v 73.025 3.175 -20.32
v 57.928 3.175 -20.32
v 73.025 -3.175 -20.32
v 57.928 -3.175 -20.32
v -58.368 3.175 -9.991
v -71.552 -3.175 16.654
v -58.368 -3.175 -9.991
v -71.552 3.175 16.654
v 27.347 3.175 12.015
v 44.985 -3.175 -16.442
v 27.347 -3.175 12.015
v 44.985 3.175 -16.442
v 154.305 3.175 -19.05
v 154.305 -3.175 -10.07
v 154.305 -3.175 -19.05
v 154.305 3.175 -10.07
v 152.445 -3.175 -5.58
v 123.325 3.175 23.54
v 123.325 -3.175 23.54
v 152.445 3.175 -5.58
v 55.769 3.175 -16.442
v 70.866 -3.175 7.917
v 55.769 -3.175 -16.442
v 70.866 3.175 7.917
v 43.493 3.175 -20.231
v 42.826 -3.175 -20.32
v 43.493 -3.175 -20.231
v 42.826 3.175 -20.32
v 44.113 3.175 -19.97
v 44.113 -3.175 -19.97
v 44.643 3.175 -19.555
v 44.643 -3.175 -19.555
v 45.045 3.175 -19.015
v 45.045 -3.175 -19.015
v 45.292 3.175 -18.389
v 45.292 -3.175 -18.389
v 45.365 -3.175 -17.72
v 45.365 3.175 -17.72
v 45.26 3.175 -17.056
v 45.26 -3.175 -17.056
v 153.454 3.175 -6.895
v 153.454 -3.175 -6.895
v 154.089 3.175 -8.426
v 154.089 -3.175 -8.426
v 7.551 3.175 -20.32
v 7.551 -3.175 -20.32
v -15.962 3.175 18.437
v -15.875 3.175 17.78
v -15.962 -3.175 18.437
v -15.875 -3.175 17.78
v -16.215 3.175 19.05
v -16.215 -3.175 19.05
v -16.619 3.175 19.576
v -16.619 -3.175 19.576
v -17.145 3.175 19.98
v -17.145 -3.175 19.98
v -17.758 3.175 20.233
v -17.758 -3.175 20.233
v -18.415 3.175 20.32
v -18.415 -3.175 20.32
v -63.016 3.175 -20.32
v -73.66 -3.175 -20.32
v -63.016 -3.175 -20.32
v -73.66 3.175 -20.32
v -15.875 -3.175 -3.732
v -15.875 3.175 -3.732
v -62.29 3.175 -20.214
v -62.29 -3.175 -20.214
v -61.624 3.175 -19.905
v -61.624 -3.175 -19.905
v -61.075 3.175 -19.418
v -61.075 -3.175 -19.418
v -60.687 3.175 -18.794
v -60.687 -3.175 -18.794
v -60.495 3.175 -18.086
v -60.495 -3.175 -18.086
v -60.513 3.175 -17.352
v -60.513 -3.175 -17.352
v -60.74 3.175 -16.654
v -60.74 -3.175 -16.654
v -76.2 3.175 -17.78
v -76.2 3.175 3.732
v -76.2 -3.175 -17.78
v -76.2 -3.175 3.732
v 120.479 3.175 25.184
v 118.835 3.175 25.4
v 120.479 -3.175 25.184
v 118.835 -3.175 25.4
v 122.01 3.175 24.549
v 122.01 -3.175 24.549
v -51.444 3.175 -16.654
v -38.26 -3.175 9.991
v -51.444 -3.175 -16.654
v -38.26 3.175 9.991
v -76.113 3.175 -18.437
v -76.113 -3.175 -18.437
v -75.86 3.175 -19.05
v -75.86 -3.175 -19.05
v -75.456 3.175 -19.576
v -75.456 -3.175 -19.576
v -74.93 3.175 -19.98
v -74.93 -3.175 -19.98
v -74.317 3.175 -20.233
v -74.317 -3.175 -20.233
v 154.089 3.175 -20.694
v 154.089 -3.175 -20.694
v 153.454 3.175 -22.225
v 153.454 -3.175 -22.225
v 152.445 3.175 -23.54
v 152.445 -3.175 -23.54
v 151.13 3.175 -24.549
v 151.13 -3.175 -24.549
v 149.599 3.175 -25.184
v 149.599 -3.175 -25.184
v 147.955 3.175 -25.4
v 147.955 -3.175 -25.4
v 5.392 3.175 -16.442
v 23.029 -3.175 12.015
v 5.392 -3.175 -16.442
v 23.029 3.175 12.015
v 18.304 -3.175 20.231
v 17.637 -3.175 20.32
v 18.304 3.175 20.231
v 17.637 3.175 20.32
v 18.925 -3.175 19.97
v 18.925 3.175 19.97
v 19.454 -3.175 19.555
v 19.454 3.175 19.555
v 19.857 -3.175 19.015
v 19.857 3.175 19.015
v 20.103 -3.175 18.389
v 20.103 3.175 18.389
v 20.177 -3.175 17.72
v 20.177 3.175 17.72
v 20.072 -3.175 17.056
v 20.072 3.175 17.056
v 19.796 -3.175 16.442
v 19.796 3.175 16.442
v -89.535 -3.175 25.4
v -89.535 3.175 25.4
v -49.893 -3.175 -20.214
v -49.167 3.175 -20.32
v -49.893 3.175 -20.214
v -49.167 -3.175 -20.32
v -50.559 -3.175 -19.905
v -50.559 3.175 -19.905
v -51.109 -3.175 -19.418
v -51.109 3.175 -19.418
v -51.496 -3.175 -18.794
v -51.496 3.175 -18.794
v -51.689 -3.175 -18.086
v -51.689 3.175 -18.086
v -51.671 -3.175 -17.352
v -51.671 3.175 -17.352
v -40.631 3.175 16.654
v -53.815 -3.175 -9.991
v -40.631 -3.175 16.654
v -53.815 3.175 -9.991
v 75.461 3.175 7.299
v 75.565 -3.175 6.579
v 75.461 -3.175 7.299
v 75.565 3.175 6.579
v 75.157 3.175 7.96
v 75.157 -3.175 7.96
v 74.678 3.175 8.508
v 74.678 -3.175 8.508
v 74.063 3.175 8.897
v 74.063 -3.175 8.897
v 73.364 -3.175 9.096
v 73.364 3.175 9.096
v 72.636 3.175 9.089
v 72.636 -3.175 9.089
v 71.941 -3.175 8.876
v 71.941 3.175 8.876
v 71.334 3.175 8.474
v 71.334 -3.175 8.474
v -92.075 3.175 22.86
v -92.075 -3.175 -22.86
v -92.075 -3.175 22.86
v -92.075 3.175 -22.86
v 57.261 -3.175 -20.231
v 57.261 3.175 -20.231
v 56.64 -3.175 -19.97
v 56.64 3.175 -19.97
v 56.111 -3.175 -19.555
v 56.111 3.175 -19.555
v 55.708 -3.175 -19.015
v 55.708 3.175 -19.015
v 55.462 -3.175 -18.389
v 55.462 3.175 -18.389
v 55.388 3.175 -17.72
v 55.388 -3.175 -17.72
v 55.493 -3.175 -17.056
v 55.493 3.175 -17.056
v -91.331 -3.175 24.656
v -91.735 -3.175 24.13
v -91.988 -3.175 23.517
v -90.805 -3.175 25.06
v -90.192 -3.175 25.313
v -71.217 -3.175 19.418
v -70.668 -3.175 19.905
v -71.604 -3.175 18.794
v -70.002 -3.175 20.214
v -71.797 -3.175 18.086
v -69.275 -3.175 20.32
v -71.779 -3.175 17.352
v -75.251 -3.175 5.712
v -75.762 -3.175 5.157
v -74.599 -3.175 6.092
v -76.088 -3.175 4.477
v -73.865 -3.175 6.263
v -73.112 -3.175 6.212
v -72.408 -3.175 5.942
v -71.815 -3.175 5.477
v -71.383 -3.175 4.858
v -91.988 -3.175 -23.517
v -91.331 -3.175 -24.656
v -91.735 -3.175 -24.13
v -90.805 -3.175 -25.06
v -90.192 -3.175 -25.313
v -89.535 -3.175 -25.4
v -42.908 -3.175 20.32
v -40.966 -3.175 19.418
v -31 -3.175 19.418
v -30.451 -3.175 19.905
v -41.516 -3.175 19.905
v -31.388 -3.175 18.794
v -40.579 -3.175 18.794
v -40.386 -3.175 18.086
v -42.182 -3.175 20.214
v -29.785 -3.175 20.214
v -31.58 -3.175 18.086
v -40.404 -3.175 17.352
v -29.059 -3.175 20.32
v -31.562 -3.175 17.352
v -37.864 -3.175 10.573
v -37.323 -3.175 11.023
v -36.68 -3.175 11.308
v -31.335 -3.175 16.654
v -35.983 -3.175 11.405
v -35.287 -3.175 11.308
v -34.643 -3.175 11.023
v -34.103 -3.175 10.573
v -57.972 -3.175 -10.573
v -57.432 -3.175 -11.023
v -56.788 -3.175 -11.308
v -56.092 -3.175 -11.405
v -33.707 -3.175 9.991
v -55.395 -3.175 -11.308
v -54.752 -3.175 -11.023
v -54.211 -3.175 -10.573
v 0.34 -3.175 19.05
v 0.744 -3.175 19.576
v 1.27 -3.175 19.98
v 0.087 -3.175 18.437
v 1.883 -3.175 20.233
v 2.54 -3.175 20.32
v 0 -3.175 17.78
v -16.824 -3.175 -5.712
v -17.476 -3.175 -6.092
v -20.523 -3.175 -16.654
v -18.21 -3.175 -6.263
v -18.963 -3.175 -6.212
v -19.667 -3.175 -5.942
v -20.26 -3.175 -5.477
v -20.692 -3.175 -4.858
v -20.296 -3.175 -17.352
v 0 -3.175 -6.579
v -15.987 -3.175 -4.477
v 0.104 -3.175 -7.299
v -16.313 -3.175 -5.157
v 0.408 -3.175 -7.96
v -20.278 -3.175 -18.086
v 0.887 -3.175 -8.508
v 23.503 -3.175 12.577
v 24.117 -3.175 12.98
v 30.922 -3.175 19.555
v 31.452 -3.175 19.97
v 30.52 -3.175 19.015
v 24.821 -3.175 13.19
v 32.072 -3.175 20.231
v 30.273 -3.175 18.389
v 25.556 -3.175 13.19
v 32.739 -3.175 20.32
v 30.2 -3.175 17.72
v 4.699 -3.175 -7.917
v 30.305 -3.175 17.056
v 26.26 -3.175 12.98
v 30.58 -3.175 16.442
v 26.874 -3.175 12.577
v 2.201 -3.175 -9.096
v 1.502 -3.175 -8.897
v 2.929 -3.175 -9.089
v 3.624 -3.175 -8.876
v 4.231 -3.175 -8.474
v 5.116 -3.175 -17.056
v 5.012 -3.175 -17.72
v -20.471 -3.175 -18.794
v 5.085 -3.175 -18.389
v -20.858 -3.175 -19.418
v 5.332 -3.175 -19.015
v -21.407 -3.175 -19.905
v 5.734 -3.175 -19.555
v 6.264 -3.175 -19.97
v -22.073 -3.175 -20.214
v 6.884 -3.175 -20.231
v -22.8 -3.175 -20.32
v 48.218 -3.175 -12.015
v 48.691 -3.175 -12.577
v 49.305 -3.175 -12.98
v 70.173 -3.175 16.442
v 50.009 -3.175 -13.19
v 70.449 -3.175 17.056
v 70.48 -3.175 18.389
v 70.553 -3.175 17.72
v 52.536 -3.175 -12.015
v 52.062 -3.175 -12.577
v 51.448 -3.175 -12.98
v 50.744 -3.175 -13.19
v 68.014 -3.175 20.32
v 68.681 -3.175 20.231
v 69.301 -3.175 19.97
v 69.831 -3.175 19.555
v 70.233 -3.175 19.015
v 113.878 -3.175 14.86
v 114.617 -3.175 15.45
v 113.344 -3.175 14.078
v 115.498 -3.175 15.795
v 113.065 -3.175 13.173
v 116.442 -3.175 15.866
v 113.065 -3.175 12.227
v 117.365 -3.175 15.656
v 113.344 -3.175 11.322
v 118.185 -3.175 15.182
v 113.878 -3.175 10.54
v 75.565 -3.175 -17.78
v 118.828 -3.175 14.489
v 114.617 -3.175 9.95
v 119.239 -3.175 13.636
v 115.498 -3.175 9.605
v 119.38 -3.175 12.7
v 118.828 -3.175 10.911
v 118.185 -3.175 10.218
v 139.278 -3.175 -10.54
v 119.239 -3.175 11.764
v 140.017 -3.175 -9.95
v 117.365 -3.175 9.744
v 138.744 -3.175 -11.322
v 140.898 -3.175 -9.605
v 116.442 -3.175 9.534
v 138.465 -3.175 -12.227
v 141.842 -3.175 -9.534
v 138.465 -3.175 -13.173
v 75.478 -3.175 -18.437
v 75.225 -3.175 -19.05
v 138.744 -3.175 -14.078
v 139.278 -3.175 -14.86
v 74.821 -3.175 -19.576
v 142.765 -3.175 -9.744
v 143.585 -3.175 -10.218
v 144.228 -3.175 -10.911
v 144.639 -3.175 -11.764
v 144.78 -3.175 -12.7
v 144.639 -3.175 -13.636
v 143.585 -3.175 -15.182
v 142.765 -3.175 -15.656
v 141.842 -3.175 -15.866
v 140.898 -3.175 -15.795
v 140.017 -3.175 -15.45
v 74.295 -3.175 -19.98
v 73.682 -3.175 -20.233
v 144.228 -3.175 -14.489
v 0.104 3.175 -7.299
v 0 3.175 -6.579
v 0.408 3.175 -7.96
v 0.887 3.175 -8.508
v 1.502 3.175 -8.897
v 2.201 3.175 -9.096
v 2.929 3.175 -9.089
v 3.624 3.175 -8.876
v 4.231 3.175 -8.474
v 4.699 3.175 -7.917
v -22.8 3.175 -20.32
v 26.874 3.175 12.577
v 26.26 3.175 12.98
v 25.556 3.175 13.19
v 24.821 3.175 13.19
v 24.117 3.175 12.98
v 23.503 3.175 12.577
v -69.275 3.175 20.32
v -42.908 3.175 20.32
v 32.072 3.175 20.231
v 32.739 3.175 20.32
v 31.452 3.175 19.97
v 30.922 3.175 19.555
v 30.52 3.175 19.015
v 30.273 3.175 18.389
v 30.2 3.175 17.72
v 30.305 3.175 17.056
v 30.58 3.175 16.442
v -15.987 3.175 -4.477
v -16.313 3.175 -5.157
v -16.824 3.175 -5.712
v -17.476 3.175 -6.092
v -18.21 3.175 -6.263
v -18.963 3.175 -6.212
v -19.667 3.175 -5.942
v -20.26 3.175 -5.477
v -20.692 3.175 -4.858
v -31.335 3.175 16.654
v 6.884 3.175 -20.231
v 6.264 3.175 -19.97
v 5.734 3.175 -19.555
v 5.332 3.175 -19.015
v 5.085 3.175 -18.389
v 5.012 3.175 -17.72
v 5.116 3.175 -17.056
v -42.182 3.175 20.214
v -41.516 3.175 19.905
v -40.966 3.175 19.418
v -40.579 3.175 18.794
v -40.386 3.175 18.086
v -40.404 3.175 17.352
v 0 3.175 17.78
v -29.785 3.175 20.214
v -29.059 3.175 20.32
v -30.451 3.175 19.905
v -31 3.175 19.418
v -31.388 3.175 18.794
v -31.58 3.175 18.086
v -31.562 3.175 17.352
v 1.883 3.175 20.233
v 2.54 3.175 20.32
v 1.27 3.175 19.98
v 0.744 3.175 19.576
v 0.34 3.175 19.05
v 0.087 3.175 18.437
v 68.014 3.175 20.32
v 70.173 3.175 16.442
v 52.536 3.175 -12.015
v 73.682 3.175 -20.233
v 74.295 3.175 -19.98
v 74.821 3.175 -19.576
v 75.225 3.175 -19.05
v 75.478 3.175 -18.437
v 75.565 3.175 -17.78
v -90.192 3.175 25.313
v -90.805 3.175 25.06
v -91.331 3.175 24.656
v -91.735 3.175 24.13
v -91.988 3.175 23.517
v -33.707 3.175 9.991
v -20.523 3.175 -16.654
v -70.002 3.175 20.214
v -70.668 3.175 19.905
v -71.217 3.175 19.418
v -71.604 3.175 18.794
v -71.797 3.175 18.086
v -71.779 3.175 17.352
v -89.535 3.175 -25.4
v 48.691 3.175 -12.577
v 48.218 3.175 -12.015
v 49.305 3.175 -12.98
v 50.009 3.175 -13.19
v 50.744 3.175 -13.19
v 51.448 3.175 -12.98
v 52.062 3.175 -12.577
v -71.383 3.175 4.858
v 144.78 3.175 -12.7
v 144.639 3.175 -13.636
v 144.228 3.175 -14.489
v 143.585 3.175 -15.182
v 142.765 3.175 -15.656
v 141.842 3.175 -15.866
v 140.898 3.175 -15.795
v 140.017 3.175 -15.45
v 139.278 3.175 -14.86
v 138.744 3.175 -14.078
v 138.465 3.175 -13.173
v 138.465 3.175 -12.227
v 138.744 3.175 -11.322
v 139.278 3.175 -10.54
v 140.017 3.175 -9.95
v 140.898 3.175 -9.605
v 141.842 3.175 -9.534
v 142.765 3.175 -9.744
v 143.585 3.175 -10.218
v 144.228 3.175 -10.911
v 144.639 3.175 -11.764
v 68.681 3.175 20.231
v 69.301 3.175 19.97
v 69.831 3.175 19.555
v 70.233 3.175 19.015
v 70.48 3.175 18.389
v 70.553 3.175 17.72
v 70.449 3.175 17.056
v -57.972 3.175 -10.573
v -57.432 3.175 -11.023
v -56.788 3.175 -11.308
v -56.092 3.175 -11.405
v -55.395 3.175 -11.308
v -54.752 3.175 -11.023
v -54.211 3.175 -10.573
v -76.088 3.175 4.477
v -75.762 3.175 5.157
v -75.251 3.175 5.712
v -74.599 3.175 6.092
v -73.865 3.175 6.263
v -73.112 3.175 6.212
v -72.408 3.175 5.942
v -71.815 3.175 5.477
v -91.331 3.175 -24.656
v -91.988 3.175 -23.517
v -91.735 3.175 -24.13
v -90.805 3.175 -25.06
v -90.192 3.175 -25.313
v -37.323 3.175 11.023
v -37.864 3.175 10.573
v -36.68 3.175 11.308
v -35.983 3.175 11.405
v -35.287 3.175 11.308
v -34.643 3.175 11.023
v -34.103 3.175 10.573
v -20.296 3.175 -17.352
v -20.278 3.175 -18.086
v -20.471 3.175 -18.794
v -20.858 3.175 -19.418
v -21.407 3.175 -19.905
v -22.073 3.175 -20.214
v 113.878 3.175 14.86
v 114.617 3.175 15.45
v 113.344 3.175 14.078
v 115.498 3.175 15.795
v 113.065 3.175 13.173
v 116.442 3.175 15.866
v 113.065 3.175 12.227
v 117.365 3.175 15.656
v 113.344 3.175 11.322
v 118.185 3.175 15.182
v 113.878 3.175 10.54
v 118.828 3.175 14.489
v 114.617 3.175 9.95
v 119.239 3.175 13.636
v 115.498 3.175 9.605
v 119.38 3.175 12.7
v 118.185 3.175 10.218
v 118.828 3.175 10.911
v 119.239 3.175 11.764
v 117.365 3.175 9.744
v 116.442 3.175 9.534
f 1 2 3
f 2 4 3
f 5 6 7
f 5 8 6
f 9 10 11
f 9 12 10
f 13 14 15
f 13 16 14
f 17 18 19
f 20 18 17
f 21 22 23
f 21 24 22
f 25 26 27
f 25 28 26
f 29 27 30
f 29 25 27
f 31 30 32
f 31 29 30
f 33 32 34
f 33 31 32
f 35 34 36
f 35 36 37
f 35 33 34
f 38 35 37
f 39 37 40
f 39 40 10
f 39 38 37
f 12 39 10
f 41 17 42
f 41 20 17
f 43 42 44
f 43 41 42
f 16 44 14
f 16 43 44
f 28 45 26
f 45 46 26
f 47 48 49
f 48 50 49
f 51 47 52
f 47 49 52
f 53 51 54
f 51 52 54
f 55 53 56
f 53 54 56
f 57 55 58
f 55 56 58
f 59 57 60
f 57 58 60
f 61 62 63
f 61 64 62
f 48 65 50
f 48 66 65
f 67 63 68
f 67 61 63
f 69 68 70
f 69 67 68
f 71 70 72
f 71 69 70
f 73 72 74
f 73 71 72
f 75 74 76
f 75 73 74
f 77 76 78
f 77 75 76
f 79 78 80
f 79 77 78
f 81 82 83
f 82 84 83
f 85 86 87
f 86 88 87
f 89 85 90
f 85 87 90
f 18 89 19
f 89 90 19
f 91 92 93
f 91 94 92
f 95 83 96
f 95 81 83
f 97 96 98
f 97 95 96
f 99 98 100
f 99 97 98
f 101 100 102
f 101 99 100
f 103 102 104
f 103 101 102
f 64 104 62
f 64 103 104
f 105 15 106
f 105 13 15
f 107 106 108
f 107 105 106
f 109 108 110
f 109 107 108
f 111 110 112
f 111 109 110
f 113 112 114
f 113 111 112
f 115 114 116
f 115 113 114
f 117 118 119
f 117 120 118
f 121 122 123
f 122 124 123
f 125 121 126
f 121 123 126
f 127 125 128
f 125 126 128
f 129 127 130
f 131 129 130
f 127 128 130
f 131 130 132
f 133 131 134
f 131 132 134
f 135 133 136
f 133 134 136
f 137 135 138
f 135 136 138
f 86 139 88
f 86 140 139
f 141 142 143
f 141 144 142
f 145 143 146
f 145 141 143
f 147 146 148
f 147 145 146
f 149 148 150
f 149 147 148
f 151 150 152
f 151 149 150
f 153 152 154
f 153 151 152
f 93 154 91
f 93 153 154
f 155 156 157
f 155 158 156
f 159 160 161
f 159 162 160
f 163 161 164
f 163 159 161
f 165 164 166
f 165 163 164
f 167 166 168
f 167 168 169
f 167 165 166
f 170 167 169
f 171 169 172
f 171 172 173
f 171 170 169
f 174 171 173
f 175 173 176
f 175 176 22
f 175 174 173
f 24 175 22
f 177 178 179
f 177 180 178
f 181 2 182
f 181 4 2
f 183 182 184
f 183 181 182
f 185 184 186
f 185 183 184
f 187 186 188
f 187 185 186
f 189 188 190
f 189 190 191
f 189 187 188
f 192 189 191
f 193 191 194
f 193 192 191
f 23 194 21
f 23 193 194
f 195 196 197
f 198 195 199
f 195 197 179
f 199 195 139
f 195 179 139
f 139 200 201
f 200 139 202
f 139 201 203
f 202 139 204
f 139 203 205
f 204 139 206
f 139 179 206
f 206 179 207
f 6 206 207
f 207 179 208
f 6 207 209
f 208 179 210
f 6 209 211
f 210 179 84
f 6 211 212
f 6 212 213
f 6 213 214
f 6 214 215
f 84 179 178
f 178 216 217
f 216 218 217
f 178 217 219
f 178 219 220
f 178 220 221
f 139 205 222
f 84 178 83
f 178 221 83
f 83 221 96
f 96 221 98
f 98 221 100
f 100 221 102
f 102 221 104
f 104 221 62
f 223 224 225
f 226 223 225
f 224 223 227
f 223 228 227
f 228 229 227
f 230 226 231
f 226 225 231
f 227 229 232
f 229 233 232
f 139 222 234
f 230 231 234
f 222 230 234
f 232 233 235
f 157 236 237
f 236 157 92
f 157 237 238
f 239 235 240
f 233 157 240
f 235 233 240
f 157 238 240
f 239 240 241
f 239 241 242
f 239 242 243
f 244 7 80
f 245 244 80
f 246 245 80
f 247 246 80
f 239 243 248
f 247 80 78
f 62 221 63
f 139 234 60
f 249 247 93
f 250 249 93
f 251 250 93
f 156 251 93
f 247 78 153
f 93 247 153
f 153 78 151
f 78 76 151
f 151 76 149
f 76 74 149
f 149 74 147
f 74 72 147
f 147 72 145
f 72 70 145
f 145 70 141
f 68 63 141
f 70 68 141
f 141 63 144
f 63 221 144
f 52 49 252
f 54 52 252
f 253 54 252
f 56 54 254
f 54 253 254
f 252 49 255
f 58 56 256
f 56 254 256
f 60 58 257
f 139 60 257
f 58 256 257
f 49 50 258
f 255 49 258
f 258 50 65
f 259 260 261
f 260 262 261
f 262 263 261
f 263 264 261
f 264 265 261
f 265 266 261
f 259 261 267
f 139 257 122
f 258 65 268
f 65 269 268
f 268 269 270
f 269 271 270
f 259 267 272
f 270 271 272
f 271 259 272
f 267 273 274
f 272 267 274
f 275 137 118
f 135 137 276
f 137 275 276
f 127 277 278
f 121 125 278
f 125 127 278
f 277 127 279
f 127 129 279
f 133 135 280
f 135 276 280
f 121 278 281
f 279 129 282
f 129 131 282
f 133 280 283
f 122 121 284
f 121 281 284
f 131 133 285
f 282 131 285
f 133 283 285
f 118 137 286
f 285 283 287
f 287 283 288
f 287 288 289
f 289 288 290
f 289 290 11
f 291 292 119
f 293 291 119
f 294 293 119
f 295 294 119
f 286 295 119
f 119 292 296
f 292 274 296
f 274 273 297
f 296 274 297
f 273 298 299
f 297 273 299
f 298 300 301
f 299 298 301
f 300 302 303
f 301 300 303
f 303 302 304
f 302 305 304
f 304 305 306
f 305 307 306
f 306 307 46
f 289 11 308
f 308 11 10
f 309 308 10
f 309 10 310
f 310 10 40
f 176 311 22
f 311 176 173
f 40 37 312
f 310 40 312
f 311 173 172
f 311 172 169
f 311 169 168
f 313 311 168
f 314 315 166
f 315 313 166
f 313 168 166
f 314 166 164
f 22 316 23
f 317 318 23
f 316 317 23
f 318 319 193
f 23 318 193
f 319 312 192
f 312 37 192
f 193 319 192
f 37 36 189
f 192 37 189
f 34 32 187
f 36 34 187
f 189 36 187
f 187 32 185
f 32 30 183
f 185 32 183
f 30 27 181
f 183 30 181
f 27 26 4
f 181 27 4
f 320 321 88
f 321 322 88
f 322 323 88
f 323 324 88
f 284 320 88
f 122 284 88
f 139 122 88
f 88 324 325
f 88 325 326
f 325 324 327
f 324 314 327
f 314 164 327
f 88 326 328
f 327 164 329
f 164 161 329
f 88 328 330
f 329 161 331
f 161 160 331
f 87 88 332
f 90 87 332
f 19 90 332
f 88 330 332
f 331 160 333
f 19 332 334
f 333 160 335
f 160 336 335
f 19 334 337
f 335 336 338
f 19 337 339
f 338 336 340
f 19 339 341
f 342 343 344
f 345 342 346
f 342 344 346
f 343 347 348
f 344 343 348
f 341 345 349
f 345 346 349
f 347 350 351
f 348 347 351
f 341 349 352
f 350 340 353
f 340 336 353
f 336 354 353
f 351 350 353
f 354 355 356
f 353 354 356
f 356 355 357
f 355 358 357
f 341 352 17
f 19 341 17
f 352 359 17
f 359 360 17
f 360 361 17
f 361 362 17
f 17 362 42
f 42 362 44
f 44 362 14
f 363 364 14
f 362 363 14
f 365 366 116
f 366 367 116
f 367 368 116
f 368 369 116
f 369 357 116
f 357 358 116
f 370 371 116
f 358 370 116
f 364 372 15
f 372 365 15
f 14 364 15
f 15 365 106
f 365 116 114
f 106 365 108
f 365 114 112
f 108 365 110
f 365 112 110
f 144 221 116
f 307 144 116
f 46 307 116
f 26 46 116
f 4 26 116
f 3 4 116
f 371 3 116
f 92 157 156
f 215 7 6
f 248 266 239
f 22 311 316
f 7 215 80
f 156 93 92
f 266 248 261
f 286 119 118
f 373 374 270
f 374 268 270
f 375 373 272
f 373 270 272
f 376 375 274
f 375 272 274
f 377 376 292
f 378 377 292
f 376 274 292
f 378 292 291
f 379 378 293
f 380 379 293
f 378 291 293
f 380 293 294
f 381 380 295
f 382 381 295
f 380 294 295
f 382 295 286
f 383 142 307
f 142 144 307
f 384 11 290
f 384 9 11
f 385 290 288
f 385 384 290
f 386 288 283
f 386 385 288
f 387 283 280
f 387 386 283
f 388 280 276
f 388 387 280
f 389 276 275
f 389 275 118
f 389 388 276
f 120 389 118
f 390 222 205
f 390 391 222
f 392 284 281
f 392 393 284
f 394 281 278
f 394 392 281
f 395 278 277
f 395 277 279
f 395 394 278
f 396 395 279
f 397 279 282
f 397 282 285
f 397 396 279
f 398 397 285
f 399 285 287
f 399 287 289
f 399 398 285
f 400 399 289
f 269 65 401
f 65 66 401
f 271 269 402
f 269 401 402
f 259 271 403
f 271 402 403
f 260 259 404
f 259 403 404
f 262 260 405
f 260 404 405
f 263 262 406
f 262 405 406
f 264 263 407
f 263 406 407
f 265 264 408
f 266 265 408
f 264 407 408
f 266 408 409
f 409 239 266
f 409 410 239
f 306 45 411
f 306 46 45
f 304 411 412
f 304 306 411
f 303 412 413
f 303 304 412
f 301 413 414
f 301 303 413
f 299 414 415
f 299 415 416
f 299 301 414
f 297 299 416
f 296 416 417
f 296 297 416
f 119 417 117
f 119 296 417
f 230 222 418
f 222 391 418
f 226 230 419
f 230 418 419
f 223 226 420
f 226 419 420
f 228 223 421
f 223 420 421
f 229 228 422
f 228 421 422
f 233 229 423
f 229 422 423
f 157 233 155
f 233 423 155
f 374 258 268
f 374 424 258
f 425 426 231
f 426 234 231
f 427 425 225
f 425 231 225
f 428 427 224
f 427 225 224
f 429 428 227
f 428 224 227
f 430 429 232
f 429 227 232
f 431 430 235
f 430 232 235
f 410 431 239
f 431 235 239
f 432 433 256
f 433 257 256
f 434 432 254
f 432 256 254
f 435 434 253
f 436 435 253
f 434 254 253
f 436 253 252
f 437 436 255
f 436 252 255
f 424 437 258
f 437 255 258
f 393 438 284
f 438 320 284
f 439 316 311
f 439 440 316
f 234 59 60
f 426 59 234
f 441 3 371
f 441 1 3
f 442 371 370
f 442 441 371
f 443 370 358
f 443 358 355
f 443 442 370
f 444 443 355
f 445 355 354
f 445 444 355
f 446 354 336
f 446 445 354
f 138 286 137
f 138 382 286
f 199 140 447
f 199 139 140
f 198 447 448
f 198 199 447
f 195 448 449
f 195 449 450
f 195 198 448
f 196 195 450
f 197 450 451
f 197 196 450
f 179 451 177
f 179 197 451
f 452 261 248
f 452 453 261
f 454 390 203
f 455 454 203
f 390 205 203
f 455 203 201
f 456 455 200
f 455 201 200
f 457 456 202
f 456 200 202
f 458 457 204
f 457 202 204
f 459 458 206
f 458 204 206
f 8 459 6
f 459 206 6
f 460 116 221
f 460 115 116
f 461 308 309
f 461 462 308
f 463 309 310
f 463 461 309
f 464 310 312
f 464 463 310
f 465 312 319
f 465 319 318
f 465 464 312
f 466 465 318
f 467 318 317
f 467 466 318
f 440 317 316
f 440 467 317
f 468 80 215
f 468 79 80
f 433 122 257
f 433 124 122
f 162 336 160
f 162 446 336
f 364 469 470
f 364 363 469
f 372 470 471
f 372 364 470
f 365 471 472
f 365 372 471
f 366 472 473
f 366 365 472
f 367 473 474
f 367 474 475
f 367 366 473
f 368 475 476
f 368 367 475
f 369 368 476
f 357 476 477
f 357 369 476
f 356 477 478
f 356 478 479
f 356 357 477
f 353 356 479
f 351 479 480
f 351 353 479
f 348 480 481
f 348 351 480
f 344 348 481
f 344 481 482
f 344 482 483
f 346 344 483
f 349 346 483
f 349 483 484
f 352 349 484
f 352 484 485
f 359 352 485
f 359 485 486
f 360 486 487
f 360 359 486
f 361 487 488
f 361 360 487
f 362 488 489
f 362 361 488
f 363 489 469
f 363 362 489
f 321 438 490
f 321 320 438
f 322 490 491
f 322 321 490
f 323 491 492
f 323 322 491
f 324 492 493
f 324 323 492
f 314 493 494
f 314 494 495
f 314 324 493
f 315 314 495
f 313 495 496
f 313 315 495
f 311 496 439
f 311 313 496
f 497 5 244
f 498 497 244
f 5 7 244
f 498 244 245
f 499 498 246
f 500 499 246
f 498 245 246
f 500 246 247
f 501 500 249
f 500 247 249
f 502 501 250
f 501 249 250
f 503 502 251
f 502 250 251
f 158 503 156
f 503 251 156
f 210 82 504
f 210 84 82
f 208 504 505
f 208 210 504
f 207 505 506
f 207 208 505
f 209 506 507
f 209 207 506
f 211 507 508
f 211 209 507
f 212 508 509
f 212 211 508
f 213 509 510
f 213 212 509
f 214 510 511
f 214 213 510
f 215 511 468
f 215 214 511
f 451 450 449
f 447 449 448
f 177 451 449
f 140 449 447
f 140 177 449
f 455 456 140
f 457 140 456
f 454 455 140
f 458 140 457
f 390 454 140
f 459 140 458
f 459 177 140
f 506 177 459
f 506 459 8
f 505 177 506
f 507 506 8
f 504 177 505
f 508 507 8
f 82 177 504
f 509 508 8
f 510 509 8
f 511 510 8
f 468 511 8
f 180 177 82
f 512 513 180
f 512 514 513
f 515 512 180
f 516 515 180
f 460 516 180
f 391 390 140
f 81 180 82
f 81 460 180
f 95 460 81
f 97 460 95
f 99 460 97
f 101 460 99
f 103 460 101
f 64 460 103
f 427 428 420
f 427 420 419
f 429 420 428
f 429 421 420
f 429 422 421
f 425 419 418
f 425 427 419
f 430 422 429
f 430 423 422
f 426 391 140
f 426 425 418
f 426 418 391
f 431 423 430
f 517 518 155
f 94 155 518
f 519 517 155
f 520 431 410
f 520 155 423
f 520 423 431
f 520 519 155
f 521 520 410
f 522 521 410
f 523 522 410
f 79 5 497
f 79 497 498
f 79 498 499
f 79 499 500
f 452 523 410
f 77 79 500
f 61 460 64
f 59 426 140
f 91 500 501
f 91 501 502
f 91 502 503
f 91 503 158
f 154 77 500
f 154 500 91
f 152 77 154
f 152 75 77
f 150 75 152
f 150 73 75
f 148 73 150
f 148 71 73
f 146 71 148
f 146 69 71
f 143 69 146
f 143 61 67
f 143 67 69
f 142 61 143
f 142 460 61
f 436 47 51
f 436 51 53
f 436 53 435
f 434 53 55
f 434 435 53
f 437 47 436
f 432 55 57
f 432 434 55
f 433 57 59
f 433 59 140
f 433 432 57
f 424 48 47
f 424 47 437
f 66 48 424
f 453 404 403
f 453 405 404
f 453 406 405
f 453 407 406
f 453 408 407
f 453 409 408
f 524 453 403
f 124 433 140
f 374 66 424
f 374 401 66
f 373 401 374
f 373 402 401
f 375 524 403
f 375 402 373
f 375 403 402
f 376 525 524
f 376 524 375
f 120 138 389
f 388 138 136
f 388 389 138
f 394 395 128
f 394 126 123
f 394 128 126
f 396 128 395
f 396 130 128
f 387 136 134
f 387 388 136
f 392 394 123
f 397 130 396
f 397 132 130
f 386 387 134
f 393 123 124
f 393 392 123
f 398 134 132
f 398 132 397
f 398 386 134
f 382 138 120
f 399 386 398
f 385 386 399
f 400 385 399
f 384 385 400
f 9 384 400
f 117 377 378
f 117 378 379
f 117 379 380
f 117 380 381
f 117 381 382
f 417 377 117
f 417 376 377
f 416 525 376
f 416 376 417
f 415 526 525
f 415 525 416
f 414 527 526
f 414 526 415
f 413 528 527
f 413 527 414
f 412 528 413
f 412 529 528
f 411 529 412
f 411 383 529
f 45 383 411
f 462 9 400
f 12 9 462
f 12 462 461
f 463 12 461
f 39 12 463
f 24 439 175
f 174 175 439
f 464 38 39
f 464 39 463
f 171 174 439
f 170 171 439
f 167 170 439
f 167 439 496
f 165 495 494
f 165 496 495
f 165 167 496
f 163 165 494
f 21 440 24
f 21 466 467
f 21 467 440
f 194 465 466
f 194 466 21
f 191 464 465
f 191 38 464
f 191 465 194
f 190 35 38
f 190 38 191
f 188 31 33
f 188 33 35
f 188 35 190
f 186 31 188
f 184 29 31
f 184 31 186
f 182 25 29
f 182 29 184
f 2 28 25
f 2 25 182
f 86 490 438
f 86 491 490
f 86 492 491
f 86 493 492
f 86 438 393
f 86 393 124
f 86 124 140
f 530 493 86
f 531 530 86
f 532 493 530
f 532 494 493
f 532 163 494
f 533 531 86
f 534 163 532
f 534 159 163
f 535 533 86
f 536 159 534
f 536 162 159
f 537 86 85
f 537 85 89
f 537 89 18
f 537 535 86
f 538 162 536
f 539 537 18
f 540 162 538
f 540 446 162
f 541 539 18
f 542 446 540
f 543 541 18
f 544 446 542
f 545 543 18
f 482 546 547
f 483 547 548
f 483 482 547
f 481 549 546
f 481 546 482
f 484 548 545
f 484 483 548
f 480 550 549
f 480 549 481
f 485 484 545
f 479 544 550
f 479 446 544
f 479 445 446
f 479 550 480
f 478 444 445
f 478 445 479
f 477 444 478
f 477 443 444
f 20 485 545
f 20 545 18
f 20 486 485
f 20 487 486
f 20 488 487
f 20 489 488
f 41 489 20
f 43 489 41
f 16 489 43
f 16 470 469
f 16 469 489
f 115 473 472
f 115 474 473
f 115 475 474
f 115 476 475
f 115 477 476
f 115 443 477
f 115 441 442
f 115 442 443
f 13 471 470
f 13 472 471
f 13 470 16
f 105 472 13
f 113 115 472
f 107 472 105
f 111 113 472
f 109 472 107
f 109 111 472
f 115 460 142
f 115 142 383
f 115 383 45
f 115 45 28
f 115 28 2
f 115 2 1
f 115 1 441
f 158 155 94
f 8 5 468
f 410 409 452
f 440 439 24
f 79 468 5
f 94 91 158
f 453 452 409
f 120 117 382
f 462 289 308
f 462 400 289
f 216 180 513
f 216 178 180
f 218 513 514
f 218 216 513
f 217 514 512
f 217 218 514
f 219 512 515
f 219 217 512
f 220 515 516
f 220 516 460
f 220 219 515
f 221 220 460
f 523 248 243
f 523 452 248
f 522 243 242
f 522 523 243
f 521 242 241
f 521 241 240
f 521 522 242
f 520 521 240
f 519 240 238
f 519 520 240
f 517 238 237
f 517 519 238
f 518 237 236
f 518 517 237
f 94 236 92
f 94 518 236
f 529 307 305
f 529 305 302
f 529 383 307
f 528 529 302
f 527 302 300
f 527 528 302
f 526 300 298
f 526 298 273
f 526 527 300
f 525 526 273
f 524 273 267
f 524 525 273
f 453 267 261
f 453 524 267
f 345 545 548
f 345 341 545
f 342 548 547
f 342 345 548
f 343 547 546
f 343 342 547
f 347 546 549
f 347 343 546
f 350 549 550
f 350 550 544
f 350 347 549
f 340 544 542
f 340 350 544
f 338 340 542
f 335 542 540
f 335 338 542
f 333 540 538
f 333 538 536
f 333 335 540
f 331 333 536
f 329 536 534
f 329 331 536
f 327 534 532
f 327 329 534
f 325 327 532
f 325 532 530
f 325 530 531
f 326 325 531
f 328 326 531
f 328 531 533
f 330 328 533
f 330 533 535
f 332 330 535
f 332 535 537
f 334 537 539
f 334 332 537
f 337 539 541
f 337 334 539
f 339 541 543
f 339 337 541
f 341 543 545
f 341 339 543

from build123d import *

# Parameters (mm, degrees)
SKETCH1_R           = 3.175
BOSS_EXTRUDE1_DEPTH = 3.175
FILLET1_R           = 2.54
FILLET2_R           = 6.35


with BuildPart() as part:
    # Sketch1 → Boss-Extrude1 (new body, symmetric)
    with BuildSketch(Plane(origin=(0, 0, 0), x_dir=(1, 0, 0), z_dir=(0, 1, 0))):
        Polygon((121.465512242, -25.4), (154.305, 7.439487758), (154.305, 25.4), (-92.075, 25.4), (-92.075, -25.4), align=None)
        Polygon((-38.817248104, -20.32), (-73.366085229, -20.32), (-56.091666667, 14.592509095), align=None, mode=Mode.SUBTRACT)
        Polygon((-15.875, 14.592509095), (-15.875, -20.32), (-33.149418563, -20.32), align=None, mode=Mode.SUBTRACT)
        Polygon((22.200034711, -20.32), (0, -20.32), (0, 15.498543399), align=None, mode=Mode.SUBTRACT)
        with Locations((116.205, -12.7)):
            Circle(SKETCH1_R, mode=Mode.SUBTRACT)
        Polygon((72.576701378, -20.32), (28.176631956, -20.32), (50.376666667, 15.498543399), align=None, mode=Mode.SUBTRACT)
        Polygon((53.364965289, 20.32), (75.565, 20.32), (75.565, -15.498543399), align=None, mode=Mode.SUBTRACT)
        Polygon((-76.2, -14.592509095), (-76.2, 20.32), (-58.925581437, 20.32), align=None, mode=Mode.SUBTRACT)
        Polygon((-53.257751896, 20.32), (-18.708914771, 20.32), (-35.983333333, -14.592509095), align=None, mode=Mode.SUBTRACT)
        Polygon((2.988298622, 20.32), (47.388368044, 20.32), (25.188333333, -15.498543399), align=None, mode=Mode.SUBTRACT)
        with Locations((141.605, 12.7)):
            Circle(SKETCH1_R, mode=Mode.SUBTRACT)
    extrude(amount=BOSS_EXTRUDE1_DEPTH, both=True)

    # Fillet1
    fillet1_edges = [part.edges().sort_by_distance(p)[0] for p in [
        (-76.2, 0, -20.32),
        (-76.2, 0, 14.592509095),
        (-58.925581437, 0, -20.32),
        (2.988298622, 0, -20.32),
        (25.188333333, 0, 15.498543399),
        (47.388368044, 0, -20.32),
        (0, 0, -15.498543399),
        (0, 0, 20.32),
        (22.200034711, 0, 20.32),
        (72.576701378, 0, 20.32),
        (50.376666667, 0, -15.498543399),
        (28.176631956, 0, 20.32),
        (75.565, 0, 15.498543399),
        (75.565, 0, -20.32),
        (53.364965289, 0, -20.32),
        (-15.875, 0, 20.32),
        (-15.875, 0, -14.592509095),
        (-33.149418563, 0, 20.32),
        (-35.983333333, 0, 14.592509095),
        (-18.708914771, 0, -20.32),
        (-53.257751896, 0, -20.32),
        (-92.075, 0, 25.4),
        (-92.075, 0, -25.4),
        (-38.817248104, 0, 20.32),
        (-56.091666667, 0, -14.592509095),
        (-73.366085229, 0, 20.32),
    ]]
    fillet(fillet1_edges, radius=FILLET1_R)

    # Fillet2
    fillet2_edges = [part.edges().sort_by_distance(p)[0] for p in [
        (154.305, 0, -25.4),
        (154.305, 0, -7.439487758),
        (121.465512242, 0, 25.4),
    ]]
    fillet(fillet2_edges, radius=FILLET2_R)


solid = part.part
